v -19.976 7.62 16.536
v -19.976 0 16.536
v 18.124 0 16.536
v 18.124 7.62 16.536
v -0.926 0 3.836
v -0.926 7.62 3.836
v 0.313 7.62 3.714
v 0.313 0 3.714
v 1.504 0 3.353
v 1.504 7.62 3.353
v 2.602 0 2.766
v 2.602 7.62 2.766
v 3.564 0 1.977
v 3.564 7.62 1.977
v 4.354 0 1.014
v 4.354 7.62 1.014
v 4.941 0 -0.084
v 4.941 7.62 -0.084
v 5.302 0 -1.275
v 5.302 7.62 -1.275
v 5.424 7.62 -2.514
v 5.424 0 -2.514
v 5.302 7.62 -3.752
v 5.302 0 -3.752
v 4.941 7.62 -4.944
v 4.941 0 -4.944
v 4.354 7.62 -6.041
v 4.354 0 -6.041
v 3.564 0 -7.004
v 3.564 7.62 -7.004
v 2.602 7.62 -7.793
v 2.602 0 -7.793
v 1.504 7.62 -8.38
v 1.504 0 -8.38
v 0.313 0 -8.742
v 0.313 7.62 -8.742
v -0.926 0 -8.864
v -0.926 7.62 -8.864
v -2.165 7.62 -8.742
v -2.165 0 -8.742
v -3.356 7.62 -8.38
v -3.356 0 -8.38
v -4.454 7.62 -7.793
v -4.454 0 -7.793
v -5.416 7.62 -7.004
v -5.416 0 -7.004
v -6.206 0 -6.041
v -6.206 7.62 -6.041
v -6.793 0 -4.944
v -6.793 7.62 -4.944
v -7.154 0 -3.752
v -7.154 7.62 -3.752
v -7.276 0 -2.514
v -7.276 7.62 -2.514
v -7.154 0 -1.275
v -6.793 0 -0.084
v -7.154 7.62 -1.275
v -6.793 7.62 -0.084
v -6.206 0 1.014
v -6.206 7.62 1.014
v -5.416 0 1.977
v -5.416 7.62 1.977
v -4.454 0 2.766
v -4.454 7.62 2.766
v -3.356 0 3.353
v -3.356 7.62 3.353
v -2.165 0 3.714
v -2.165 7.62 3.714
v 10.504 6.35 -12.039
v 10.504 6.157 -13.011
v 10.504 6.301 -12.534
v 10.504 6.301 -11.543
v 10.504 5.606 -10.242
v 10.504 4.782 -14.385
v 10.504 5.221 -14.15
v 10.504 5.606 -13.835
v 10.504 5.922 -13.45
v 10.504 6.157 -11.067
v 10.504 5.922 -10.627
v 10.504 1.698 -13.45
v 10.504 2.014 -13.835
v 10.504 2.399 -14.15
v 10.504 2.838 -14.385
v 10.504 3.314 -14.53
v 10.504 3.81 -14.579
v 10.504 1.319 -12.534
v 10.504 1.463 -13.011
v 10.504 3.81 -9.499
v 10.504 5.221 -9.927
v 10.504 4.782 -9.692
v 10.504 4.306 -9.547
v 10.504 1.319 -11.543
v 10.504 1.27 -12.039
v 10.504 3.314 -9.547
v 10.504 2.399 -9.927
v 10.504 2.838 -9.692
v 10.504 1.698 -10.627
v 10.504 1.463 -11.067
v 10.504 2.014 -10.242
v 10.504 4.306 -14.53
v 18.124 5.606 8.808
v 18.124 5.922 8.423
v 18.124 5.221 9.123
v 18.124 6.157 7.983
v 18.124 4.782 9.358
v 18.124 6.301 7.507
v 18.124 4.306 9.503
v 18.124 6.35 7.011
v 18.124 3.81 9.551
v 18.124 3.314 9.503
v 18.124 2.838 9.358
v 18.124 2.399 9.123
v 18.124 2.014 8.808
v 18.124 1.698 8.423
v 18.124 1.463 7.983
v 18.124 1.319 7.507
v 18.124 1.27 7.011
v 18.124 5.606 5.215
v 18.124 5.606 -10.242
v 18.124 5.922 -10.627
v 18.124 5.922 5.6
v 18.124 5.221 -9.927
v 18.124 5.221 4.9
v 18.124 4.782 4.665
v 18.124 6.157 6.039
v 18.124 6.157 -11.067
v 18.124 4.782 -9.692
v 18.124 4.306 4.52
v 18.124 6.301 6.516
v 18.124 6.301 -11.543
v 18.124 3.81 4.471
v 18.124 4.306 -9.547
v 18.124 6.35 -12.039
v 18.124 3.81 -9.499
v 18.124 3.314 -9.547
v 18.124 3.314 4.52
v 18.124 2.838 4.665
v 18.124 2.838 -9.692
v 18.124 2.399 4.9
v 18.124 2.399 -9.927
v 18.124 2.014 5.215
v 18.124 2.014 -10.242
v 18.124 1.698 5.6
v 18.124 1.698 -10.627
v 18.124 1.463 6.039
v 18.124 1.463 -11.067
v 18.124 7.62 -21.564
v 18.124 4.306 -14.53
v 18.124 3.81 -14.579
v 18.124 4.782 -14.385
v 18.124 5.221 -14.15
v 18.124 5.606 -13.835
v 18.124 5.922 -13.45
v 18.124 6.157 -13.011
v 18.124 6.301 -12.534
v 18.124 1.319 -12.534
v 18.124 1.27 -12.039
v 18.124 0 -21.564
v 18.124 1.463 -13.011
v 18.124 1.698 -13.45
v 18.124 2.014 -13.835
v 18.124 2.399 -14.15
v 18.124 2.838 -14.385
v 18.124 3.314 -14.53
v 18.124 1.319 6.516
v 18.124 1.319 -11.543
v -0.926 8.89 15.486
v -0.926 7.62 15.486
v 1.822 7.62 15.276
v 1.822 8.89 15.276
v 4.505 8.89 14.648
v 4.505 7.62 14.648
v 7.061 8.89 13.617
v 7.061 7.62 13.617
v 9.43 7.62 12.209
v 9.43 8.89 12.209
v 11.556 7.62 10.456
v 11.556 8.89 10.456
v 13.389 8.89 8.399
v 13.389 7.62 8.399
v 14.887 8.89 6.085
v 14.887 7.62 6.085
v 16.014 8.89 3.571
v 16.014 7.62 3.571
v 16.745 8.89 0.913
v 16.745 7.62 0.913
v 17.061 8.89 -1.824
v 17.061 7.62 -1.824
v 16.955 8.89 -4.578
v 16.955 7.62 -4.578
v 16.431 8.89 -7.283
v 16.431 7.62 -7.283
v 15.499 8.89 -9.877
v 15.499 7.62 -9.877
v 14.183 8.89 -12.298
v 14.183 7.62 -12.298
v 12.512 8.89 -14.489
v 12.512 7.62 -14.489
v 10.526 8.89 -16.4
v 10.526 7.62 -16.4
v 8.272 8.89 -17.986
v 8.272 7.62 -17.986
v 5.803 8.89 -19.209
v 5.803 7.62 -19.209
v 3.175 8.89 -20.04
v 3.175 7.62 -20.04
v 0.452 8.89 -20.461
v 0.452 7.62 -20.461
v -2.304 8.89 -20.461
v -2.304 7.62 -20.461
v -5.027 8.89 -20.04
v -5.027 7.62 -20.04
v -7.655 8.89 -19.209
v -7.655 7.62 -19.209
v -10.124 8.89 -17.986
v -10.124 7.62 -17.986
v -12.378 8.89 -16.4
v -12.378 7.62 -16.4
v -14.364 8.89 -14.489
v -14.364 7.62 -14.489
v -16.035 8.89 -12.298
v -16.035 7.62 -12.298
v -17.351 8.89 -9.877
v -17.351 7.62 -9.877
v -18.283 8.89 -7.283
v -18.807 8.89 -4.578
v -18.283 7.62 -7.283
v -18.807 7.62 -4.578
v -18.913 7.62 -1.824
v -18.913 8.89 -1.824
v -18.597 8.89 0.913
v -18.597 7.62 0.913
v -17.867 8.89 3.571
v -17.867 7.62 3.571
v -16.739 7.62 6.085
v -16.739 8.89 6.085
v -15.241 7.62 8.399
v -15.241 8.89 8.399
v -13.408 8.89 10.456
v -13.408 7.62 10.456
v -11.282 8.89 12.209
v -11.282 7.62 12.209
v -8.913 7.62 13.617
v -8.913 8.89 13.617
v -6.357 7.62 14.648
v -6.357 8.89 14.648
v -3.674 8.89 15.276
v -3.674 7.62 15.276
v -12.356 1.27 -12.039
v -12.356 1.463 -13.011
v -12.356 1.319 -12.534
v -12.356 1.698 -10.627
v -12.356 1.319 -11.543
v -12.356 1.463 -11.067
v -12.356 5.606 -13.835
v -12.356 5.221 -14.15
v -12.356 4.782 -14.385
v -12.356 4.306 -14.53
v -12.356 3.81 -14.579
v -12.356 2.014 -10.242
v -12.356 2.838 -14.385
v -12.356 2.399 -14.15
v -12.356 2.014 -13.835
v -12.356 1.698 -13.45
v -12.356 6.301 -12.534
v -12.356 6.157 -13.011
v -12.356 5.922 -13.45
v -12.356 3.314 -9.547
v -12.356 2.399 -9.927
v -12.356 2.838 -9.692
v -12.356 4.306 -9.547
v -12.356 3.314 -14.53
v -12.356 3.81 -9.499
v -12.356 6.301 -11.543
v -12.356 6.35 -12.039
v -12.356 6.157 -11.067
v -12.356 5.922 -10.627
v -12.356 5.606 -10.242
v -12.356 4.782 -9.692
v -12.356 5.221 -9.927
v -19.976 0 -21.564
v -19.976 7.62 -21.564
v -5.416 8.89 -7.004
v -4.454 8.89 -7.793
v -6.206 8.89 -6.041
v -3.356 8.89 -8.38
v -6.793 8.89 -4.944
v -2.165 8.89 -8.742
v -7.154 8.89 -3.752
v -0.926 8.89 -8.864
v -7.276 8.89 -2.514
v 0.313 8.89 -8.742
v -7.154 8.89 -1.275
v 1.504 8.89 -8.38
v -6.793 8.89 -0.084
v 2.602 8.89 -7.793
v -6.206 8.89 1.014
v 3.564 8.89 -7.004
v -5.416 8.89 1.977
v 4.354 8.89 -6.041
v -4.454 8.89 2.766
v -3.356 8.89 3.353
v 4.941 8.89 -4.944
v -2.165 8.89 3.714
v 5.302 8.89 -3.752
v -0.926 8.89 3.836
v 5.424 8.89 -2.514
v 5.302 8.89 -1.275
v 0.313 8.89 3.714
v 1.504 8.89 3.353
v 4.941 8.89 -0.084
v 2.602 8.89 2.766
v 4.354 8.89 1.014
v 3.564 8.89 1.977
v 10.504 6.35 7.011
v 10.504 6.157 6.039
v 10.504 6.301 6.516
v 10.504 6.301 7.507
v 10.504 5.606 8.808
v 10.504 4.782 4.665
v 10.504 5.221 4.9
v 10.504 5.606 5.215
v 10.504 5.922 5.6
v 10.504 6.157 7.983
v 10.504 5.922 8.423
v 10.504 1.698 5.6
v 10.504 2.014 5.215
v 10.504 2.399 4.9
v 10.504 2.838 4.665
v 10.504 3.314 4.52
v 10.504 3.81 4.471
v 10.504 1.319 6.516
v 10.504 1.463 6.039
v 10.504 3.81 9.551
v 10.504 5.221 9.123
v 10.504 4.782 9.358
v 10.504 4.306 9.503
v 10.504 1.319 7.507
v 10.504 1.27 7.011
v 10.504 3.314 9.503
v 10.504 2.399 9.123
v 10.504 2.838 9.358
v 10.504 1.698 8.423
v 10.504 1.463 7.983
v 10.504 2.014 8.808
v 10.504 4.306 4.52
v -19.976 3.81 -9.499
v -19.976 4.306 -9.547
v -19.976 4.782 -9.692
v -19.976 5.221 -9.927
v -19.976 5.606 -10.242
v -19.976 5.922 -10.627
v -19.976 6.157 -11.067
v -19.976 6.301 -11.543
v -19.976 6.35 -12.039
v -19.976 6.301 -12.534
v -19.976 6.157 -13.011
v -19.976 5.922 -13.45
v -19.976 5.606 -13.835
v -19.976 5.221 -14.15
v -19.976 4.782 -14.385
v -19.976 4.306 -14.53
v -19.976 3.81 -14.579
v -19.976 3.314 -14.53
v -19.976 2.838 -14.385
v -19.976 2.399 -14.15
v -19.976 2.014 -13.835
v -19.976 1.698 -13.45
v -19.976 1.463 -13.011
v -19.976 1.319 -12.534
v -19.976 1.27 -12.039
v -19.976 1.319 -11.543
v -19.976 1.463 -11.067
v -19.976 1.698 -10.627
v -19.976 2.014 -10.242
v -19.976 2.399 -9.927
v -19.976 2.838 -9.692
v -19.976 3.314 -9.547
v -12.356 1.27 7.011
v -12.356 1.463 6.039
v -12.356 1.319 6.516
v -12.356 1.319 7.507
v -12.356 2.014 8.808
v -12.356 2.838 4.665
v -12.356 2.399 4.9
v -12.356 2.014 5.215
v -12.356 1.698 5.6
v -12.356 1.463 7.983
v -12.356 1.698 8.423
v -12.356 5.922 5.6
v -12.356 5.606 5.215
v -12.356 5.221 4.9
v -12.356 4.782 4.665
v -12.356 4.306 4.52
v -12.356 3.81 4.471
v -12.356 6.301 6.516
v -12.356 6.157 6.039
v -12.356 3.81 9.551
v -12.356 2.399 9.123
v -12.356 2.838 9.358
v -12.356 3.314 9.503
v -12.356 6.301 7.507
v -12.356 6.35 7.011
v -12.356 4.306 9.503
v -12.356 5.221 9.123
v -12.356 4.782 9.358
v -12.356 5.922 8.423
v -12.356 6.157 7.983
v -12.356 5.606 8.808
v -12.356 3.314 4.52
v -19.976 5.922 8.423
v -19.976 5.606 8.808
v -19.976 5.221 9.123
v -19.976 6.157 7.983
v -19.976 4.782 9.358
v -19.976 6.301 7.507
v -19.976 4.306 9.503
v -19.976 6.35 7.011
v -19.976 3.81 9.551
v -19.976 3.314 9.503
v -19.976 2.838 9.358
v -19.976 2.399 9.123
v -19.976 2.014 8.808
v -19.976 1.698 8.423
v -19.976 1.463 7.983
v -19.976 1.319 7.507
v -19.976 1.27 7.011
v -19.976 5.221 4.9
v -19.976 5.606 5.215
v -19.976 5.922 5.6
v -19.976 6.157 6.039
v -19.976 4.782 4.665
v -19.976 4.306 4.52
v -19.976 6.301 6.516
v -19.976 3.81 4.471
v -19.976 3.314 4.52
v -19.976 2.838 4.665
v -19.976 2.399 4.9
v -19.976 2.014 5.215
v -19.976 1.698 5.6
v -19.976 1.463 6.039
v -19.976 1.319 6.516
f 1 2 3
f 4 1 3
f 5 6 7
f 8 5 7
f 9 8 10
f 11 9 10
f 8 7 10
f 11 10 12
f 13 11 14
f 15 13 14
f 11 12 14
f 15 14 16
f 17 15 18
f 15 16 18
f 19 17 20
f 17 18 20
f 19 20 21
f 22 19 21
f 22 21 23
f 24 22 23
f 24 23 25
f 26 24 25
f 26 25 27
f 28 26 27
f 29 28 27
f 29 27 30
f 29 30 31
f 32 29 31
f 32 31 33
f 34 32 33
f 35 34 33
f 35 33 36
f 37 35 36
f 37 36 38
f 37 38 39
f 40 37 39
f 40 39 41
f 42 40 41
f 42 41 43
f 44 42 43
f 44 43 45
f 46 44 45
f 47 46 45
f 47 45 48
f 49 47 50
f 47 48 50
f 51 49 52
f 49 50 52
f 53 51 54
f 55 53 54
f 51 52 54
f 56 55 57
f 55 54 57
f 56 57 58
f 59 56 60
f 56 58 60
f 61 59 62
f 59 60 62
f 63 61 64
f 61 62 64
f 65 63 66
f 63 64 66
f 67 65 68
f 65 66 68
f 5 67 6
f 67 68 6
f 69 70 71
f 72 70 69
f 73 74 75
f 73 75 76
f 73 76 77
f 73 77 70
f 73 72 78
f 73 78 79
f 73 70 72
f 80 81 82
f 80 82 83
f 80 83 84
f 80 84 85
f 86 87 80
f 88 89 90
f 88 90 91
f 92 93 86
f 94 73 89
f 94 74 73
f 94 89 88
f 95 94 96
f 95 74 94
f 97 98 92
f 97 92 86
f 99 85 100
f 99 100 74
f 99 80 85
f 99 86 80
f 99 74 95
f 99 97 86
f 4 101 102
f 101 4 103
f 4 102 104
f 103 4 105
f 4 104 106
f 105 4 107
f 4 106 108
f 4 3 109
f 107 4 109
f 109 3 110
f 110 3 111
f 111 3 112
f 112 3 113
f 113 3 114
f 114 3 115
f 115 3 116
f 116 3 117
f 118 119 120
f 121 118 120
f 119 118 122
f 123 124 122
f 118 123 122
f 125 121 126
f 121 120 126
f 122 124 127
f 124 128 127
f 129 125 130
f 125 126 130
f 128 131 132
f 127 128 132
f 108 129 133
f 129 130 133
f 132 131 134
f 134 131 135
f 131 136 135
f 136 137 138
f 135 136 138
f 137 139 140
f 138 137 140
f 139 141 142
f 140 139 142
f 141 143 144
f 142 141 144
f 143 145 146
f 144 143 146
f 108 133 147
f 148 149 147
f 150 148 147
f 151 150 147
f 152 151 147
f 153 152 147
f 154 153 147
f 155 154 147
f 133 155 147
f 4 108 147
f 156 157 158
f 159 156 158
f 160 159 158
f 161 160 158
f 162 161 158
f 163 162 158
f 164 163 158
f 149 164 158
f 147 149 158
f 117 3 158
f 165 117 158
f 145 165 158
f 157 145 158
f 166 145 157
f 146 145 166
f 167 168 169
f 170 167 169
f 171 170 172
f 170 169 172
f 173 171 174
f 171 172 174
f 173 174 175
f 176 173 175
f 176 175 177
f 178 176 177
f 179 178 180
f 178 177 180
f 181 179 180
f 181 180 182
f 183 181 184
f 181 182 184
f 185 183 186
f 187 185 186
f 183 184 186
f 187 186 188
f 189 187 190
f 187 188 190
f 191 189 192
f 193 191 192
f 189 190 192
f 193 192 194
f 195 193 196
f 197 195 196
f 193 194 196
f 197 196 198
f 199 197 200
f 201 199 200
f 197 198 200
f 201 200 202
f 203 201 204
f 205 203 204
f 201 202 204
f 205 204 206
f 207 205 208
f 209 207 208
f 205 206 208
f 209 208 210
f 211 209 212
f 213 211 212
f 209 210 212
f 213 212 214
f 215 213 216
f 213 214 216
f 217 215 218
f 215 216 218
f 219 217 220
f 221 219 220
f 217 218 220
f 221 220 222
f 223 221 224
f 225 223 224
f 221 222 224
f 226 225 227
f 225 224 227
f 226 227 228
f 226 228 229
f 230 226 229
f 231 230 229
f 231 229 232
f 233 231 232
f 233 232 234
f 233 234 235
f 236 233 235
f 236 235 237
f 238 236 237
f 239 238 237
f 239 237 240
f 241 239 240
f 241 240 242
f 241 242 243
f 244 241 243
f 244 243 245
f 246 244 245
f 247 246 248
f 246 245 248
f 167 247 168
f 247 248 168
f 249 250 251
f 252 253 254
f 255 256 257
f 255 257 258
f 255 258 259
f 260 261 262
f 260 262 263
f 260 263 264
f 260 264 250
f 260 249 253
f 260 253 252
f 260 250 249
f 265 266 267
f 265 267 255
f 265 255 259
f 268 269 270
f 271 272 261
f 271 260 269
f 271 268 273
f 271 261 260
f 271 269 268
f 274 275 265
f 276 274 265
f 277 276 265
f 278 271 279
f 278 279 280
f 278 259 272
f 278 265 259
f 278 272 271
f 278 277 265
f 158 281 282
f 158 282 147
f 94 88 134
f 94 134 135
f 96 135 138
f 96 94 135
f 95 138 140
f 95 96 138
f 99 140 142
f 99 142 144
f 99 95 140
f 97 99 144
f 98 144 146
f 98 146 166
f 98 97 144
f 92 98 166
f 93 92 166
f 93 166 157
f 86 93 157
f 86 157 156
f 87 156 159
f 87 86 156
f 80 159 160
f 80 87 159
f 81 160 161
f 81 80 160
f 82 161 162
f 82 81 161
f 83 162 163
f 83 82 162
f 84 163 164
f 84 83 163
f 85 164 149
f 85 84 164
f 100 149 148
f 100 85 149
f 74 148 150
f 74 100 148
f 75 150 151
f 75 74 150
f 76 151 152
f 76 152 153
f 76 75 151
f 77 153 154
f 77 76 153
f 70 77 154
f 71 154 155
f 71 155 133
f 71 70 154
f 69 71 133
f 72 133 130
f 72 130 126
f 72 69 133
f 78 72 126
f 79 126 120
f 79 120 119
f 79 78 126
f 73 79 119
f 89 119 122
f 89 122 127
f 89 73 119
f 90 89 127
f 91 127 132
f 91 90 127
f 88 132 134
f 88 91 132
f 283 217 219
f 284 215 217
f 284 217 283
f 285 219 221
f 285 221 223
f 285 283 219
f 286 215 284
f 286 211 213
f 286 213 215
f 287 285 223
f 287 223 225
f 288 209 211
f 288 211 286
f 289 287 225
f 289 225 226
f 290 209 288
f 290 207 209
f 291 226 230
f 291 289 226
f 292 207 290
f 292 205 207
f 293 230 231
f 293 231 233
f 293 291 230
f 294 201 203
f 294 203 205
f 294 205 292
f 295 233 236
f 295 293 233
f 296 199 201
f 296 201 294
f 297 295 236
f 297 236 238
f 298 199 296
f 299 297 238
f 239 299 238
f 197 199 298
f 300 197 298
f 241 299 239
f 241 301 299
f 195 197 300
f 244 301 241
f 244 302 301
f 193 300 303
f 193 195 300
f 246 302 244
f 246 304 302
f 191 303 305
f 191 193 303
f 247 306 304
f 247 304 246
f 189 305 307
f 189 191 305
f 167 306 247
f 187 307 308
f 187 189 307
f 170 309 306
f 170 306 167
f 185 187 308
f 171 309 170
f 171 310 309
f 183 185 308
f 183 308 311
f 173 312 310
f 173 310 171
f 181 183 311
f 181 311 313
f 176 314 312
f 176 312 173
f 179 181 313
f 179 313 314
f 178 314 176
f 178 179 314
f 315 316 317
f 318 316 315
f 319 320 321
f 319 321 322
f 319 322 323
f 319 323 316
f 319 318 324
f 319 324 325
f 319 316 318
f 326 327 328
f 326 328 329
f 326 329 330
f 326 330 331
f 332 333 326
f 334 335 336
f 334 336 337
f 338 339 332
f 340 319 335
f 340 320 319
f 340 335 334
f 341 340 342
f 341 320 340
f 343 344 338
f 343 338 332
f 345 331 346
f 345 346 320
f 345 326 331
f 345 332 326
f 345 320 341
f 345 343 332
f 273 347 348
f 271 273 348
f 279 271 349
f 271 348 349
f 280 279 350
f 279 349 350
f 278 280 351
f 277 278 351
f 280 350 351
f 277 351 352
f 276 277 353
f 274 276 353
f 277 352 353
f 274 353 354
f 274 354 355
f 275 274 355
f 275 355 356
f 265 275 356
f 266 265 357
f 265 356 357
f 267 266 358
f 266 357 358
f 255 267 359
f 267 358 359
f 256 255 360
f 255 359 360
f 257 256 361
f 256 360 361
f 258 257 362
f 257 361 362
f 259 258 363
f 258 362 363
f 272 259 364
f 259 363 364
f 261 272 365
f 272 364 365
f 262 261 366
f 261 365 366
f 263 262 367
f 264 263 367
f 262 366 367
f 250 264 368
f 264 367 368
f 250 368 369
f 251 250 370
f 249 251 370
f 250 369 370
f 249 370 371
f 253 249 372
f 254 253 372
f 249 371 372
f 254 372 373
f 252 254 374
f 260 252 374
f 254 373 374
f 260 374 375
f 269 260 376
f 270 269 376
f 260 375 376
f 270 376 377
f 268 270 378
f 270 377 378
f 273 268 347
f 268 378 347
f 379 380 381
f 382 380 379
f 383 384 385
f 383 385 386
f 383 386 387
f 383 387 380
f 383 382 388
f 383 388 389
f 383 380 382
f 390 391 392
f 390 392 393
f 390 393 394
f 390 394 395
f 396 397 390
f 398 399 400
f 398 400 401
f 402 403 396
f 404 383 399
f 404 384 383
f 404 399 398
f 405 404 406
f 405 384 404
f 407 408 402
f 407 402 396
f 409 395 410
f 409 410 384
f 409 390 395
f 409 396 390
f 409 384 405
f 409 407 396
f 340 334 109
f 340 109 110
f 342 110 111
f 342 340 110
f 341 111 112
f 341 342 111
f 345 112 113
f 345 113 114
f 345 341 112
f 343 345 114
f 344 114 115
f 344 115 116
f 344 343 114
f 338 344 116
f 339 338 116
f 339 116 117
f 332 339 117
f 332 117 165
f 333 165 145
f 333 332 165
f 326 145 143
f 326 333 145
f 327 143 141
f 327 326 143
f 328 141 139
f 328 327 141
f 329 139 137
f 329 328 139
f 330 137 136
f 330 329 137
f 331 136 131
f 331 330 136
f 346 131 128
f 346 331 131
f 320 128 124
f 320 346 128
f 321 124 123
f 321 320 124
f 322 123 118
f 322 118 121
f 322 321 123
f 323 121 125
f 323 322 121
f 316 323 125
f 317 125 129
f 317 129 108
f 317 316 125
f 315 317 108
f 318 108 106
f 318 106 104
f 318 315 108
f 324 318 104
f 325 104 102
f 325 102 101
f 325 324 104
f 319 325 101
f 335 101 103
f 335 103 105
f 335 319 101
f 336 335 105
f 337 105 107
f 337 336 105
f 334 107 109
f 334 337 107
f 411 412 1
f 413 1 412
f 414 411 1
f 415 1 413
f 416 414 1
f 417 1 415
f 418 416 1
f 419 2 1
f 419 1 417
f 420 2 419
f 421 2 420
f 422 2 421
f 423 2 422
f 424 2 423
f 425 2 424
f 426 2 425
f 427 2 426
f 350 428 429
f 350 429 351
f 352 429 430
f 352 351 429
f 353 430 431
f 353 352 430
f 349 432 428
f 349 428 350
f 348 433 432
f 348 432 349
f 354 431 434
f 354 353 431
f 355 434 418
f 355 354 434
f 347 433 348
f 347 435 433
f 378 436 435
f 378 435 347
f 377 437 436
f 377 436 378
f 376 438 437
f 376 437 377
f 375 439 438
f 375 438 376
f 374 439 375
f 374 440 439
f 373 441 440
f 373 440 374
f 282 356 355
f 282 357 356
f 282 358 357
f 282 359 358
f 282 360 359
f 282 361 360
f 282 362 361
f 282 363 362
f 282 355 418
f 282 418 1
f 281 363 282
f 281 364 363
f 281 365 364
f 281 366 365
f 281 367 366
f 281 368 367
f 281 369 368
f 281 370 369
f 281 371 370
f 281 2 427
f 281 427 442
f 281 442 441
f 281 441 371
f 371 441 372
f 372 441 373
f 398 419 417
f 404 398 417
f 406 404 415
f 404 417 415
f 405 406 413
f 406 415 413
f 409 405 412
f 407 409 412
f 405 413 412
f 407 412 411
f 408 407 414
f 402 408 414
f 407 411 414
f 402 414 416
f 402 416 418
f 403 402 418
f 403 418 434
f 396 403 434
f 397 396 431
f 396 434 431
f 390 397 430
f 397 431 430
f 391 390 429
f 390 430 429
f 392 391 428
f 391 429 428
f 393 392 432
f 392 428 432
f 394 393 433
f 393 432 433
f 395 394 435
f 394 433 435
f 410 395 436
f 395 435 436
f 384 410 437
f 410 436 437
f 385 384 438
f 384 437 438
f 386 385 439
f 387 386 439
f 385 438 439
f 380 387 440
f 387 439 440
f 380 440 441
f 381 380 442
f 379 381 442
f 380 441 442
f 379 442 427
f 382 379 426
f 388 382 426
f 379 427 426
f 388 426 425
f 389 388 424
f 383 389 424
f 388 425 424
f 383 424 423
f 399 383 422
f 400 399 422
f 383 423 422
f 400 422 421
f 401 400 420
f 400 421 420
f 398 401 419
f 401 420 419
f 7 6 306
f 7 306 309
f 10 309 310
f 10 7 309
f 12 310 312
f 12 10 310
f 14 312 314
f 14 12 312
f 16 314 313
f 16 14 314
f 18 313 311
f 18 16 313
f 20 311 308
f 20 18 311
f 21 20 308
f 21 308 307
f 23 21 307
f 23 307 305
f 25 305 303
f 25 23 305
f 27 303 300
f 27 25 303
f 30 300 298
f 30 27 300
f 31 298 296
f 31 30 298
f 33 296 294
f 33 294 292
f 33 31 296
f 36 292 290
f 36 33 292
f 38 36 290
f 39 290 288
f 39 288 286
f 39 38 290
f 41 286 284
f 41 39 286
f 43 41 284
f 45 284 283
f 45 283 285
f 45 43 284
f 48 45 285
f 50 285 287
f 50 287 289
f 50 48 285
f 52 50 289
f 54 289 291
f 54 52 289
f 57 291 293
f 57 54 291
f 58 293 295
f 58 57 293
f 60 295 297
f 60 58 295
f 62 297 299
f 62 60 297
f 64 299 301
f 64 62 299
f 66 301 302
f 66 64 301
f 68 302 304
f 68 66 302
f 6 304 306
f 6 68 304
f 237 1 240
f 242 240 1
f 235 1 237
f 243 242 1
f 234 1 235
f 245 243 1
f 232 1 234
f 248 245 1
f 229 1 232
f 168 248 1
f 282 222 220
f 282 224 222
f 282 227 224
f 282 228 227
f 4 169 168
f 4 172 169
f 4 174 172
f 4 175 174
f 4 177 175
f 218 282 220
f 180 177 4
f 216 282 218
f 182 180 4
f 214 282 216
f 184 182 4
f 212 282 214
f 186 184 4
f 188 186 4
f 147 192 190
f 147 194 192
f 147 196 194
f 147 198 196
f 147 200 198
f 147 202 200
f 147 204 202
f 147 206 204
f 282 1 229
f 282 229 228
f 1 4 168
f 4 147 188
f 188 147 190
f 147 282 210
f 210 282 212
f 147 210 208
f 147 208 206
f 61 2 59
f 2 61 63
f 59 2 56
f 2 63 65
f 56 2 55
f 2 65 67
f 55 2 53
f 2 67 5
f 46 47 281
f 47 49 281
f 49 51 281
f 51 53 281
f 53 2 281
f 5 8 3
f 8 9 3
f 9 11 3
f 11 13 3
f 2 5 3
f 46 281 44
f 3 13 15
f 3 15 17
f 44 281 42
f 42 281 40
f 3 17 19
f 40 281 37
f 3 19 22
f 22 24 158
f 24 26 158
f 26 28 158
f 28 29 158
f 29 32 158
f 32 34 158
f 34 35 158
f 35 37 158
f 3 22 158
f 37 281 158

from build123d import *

# Parameters (mm, degrees)
SKETCH1_W           = 38.1
SKETCH1_H           = 38.1
BOSS_EXTRUDE1_DEPTH = 7.62
SKETCH2_R           = 18
SKETCH2_R_2         = 6.35
BOSS_EXTRUDE2_DEPTH = 1.27
SKETCH5_R           = 6.35
CUT_EXTRUDE1_DEPTH  = 31.365983763
SKETCH4_R           = 2.54
CUT_EXTRUDE2_DEPTH  = 7.62
CUT_EXTRUDE3_START  = -7.62
SKETCH6_R           = 2.54
CUT_EXTRUDE3_DEPTH  = 7.62


with BuildPart() as part:
    # Sketch1 → Boss-Extrude1 (new body)
    with BuildSketch(Plane(origin=(0, 0, 0), x_dir=(1, 0, 0), z_dir=(0, 1, 0))):
        with Locations((-0.926041667, 2.513541667)):
            Rectangle(SKETCH1_W, SKETCH1_H)
    extrude(amount=BOSS_EXTRUDE1_DEPTH)

    # Sketch2 → Boss-Extrude2 (add)
    with BuildSketch(Plane(origin=(0, 7.62, 0), x_dir=(1, 0, 0), z_dir=(0, 1, 0))):
        with Locations(Location((-0.926041667, 2.513541667, 0), (0, 0, 270))):
            Circle(SKETCH2_R)
        with Locations(Location((-0.926041667, 2.513541667, 0), (0, 0, 270))):
            Circle(SKETCH2_R_2, mode=Mode.SUBTRACT)
    extrude(amount=BOSS_EXTRUDE2_DEPTH)

    # Sketch5 → Cut-Extrude1 (cut, through all)
    with BuildSketch(Plane(origin=(0, 7.62, 0), x_dir=(1, 0, 0), z_dir=(0, 1, 0))):
        with Locations(Location((-0.926041667, 2.513541667, 0), (0, 0, 270))):
            Circle(SKETCH5_R)
    extrude(amount=-CUT_EXTRUDE1_DEPTH, mode=Mode.SUBTRACT)

    # Sketch4 → Cut-Extrude2 (cut)
    with BuildSketch(Plane.ZY.offset(19.976041667)):
        with Locations((-12.038541667, 3.81)):
            Circle(SKETCH4_R)
        with Locations((7.011458333, 3.81)):
            Circle(SKETCH4_R)
    extrude(amount=-CUT_EXTRUDE2_DEPTH, mode=Mode.SUBTRACT)

    # Sketch6 → Cut-Extrude3 (cut)
    with BuildSketch(Plane(origin=(18.123958333, 0, 0), x_dir=(0, 0, -1), z_dir=(1, 0, 0)).offset(CUT_EXTRUDE3_START)):
        with Locations(Location((-7.011458333, 3.81, 0), (0, 0, 180))):
            Circle(SKETCH6_R)
        with Locations(Location((12.038541667, 3.81, 0), (0, 0, 180))):
            Circle(SKETCH6_R)
    extrude(amount=CUT_EXTRUDE3_DEPTH, mode=Mode.SUBTRACT)


solid = part.part
